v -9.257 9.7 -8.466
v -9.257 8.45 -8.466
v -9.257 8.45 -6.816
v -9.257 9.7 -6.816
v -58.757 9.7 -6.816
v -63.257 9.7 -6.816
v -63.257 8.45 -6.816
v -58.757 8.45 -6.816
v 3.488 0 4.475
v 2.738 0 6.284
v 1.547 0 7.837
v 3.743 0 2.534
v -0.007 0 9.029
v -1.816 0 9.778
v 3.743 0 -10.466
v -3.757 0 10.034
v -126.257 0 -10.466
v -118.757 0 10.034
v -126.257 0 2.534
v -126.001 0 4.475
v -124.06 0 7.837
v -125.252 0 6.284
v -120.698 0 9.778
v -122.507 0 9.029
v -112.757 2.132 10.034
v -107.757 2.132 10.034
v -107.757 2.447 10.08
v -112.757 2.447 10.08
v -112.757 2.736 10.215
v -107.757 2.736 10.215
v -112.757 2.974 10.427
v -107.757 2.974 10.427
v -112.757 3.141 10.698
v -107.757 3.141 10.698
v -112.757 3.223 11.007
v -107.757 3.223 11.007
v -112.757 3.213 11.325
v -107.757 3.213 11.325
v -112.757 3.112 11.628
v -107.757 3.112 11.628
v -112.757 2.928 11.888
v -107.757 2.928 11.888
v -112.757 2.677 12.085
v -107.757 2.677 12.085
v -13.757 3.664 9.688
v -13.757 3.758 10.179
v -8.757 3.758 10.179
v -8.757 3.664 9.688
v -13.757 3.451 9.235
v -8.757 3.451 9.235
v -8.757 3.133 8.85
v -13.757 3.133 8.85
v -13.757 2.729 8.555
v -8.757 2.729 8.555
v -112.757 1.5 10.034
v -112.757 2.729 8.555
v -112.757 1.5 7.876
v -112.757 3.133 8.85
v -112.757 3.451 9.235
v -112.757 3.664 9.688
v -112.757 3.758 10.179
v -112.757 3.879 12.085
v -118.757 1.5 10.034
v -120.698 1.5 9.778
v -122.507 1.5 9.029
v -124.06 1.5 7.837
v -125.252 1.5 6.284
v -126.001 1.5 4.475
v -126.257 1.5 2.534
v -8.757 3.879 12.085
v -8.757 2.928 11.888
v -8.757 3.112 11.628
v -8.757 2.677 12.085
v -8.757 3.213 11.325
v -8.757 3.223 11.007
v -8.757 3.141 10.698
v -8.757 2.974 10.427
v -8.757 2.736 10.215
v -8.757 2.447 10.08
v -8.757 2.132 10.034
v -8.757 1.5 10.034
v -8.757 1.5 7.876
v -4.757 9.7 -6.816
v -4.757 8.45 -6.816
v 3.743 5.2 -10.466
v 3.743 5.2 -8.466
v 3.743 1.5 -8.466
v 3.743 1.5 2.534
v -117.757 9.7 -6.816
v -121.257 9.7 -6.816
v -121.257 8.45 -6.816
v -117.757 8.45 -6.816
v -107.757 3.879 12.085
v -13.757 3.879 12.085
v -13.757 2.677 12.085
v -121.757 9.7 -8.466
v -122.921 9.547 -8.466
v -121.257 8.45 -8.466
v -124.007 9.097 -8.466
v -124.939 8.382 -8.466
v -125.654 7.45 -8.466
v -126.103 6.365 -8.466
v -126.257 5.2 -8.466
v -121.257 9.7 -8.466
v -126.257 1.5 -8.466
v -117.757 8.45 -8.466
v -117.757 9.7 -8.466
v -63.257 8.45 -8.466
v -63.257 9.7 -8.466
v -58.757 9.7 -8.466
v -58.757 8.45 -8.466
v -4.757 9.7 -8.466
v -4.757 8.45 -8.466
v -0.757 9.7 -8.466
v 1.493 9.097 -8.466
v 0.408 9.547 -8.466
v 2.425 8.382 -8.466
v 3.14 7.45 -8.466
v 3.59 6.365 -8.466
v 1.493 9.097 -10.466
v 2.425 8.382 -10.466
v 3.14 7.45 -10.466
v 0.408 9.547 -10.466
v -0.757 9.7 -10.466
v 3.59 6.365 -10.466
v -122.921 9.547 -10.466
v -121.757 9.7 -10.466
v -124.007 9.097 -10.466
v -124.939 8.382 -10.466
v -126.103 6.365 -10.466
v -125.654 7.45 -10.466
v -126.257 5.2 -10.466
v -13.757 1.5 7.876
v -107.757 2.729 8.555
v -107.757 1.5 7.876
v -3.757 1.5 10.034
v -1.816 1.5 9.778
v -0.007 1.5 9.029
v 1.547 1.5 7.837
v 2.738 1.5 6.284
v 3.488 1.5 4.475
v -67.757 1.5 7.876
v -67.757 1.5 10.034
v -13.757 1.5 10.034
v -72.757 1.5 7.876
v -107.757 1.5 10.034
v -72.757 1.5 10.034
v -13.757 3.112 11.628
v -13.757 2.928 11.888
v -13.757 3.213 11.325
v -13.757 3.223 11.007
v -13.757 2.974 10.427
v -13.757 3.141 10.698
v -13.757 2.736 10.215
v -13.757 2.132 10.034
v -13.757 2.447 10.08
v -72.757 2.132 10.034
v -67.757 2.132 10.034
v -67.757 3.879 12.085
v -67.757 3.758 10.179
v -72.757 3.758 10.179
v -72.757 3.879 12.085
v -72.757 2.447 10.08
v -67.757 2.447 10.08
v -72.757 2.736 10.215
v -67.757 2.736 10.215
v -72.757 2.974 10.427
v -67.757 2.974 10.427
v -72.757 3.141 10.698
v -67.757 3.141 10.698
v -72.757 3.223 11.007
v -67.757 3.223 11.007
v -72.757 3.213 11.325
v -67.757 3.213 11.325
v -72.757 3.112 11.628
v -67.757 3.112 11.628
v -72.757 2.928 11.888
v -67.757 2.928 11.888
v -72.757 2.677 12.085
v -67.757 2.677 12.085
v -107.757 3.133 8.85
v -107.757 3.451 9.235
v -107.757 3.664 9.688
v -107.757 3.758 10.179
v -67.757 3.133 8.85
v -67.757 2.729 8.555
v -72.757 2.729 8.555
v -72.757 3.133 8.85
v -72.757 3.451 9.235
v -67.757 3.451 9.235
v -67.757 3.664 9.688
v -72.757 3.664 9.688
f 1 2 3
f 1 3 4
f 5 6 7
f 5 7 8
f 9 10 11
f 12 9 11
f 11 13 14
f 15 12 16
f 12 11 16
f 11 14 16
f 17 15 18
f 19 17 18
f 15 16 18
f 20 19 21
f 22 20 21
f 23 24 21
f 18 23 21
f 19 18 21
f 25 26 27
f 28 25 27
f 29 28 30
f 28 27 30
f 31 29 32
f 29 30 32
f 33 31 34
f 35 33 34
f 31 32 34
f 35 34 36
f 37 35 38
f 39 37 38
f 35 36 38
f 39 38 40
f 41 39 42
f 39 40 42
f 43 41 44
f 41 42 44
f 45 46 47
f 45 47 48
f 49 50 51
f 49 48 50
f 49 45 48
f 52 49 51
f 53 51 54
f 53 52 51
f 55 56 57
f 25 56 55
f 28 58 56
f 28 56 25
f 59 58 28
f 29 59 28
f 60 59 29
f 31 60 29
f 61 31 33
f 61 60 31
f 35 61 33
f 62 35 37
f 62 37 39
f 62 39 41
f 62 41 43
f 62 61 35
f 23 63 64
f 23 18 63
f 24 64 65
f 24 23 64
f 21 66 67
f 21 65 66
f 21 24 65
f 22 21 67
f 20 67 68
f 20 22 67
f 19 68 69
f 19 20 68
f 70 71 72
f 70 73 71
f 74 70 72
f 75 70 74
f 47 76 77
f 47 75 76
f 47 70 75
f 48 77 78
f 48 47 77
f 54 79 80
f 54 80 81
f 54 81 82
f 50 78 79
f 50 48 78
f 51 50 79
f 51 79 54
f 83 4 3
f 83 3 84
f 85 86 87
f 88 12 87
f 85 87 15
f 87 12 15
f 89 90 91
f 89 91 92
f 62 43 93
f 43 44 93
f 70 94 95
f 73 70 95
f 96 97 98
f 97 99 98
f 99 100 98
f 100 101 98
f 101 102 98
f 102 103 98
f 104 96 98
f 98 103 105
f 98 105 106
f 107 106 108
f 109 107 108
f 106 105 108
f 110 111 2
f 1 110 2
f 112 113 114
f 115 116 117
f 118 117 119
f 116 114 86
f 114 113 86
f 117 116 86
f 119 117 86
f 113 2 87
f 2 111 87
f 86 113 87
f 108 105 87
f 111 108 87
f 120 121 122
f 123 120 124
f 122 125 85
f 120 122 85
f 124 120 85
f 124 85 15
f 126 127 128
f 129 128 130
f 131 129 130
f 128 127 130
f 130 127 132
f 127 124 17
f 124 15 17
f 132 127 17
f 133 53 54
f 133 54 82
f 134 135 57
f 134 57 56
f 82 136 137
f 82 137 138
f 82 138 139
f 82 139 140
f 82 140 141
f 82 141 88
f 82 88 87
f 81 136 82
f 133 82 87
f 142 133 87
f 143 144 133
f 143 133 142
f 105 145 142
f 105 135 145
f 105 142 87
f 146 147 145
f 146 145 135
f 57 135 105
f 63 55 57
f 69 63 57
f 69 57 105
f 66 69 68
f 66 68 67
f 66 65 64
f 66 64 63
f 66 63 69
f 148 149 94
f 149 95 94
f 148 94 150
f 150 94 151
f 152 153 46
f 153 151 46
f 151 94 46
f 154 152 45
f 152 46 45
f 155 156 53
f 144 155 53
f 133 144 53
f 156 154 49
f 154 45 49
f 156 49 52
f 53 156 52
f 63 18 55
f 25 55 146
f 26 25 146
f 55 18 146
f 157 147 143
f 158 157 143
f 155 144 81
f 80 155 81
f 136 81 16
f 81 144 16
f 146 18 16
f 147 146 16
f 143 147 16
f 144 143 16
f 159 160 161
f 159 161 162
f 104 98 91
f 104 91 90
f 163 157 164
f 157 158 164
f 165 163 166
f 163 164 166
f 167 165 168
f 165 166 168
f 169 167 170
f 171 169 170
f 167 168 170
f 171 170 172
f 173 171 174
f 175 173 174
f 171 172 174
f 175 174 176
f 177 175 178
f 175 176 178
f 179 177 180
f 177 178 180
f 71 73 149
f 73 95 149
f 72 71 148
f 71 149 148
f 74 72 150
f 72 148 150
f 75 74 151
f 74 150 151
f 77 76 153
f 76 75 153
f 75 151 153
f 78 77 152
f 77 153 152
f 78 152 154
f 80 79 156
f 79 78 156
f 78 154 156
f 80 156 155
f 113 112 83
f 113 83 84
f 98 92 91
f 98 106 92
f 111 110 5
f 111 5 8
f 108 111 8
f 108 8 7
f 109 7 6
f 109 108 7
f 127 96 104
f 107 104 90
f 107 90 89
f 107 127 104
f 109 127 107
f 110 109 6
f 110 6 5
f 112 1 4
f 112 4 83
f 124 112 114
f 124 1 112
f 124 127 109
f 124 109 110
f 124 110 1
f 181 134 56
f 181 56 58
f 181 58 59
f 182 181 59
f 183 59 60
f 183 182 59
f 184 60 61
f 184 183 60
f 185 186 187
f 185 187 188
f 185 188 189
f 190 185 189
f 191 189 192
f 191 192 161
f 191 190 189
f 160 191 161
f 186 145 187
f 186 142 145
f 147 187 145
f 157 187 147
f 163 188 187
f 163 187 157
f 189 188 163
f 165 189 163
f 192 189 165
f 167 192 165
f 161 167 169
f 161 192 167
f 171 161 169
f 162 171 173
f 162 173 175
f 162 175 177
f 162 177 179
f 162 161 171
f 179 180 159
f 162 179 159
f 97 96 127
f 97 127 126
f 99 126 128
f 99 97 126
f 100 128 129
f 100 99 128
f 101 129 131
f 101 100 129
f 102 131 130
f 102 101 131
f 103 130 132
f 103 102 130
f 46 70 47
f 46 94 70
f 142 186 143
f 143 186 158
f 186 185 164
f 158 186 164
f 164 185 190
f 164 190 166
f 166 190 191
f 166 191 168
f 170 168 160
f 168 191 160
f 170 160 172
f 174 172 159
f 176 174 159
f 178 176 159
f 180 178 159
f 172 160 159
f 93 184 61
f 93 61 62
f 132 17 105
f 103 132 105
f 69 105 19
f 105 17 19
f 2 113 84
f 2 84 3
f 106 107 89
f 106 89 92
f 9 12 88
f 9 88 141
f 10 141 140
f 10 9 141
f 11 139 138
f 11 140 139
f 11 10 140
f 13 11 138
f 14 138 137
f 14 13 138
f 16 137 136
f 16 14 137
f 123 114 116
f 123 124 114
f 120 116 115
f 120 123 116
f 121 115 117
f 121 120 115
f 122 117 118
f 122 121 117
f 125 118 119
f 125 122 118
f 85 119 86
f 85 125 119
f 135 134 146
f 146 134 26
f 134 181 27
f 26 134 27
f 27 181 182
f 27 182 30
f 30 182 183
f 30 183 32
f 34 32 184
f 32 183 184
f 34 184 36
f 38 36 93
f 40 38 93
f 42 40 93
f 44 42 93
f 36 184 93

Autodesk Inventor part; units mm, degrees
ref_plane "YZ Plane" through (0, 0, 0) normal (1, 0, 0) x (0, 1, 0)
ref_plane "XZ Plane" through (0, 0, 0) normal (0, 1, 0) x (-1, 0, 0)
ref_plane "XY Plane" through (0, 0, 0) normal (0, 0, 1) x (1, 0, 0)
sketch "Эскиз1" plane through (0, 0, 0) normal (0, 1, 0) x (-1, 0, 0)
  line L0 (118.7568, 10.0335) -> (3.7568, 10.0335)
  line L1 (-3.7432, 2.5335) -> (-3.7432, -10.4665)
  line L2 (-3.7432, -10.4665) -> (126.2568, -10.4665)
  line L3 (126.2568, -10.4665) -> (126.2568, 2.5335)
  arc A0 (3.7568, 10.0335) -> (-3.7432, 2.5335) centre (3.7568, 2.5335) ccw
  arc A1 (126.2568, 2.5335) -> (118.7568, 10.0335) centre (118.7568, 2.5335) ccw
  point P0 (0, 0)
  point P1 (-3.7432, 10.0335)
  dimension "d0" = 20.5
  dimension "d1" = 130
  dimension "d2" = 7.5
  dimension "d3" = 7.5
extrude "Выдавливание1" add sketch "Эскиз1" along normal blind 1.5
sketch "Эскиз2" plane through (0, 1.5, 0) normal (0, 1, 0) x (1, 0, 0)
  line L0 (3.7432, -2.5335) -> (3.7432, 10.4665) projected
  line L1 (-126.2568, 10.4665) -> (-126.2568, -2.5335) projected
  line L2 (3.7432, 10.4665) -> (-126.2568, 10.4665)
  line L3 (-126.2568, 10.4665) -> (-126.2568, 8.4665)
  line L4 (-126.2568, 8.4665) -> (3.7432, 8.4665)
  line L5 (3.7432, 8.4665) -> (3.7432, 10.4665)
  point P0 (0, 0)
  point P1 (3.7432, 8.4665)
  dimension "d6" = 2
extrude "Выдавливание2" add sketch "Эскиз2" along normal blind 8.2
fillet "Сопряжение1" radius 4.5 1 edges at (3.7432, 9.7, -9.4665)
fillet "Сопряжение2" radius 4.5 1 edges at (-126.2568, 9.7, -9.4665)
sketch "Эскиз3" plane through (-126.2568, 1.5, -8.4665) normal (0, 0, 1) x (1, 0, 0)
  line L0 (125.5, 8.2) -> (4.5, 8.2) projected
  line L1 (117, 8.2) -> (121.5, 8.2)
  line L2 (121.5, 8.2) -> (121.5, 6.95)
  line L3 (121.5, 6.95) -> (117, 6.95)
  line L4 (117, 6.95) -> (117, 8.2)
  line L5 (130, 0) -> (130, 3.7) projected
  line L6 (63, 8.2) -> (67.5, 8.2)
  line L7 (67.5, 8.2) -> (67.5, 6.95)
  line L8 (67.5, 6.95) -> (63, 6.95)
  line L9 (63, 6.95) -> (63, 8.2)
  line L10 (5, 8.2) -> (8.5, 8.2)
  line L11 (8.5, 8.2) -> (8.5, 6.95)
  line L12 (8.5, 6.95) -> (5, 6.95)
  line L13 (5, 6.95) -> (5, 8.2)
  point P0 (126.2568, -1.5)
  point P1 (121.5, 7.575)
  point P2 (63, 7.575)
  point P3 (67.5, 7.575)
  point P4 (8.5, 8.2)
  dimension "d11" = 8.5
  dimension "d12" = 4.5
  dimension "d13" = 1.25
  dimension "d14" = 58.5
  dimension "d15" = 4.5
  dimension "d16" = 1.25
  dimension "d17" = 62.5
  dimension "d18" = 3.5
  dimension "d19" = 1.25
extrude "Выдавливание3" add sketch "Эскиз3" along normal blind 1.65
ref_plane "РабПлоскость1" through (-13.7568, 0, 2.5335) normal (1, 0, 0) x (0, 0, -1)
sketch "Эскиз4" plane through (-13.7568, 0, 2.5335) normal (1, 0, 0) x (0, 0, -1)
  line L0 (-9.5515, 3.8793) -> (-9.5515, 2.1493)
  line L1 (-9.5515, 3.8793) -> (-7.6452, 3.758)
  line L2 (-6.0216, 2.729) -> (-5.3427, 1.5)
  line L3 (-7.5, 1.5) -> (-7.5, 3.23)
  arc A0 (-6.0216, 2.729) -> (-7.6452, 3.758) centre (-7.7722, 1.762) ccw
  line L4 (-8.5983, 0.5037) -> (-8.5983, 3.23) construction
  line L5 (-9.6967, 1.602) -> (-9.6967, 2.1317)
  line L6 (-7.5, 2.1317) -> (-7.5, 1.602)
  arc A1 (-9.6967, 1.602) -> (-7.5, 1.602) centre (-8.5983, 1.602) ccw
  arc A2 (-7.5, 2.1317) -> (-9.6967, 2.1317) centre (-8.5983, 2.1317) ccw
  line L7 (0, 1.5) -> (-7.5, 1.5) projected
  line L8 (-5.3427, 1.5) -> (-7.5, 1.5)
  point P0 (2.5335, 0)
  point P1 (-6.5515, 3.6883)
  point P2 (-8.5983, 1.8668)
  point P3 (-9.5515, 2.6775)
  dimension "d23" = 1.73
  dimension "d24" = 3
  dimension "d25" = 2.5
  dimension "d26" = 1.73
  dimension "d27" = 2
extrude "Выдавливание4" add sketch "Эскиз4" along normal blind 5 contours L1 A0 L2 L7 L3 A2 L0
ref_plane "РабПлоскость2" through (-40.7568, 0, 2.5335) normal (1, 0, 0) x (0, 0, -1)
mirror "Зеркальное отражение1" about plane through (-40.7568, 0, 2.5335) normal (1, 0, 0) of "Выдавливание4"
ref_plane "РабПлоскость3" through (-60.7568, 0, 2.5335) normal (1, 0, 0) x (0, 0, -1)
mirror "Зеркальное отражение2" about plane through (-60.7568, 0, 2.5335) normal (1, 0, 0) of "Выдавливание4"
sketch "Эскиз5" plane through (0, 1.5, 0) normal (0, 1, 0) x (1, 0, 0)
  point P0 (0, 0)
ref_plane "РабПлоскость4" through (0, 6, 0) normal (0, 1, 0) x (1, 0, 0)
sketch "Эскиз6" plane through (0, 6, 0) normal (0, 1, 0) x (1, 0, 0)
  line L0 (-107.513, 6.4665) -> (-116.163, 6.4665)
  line L1 (-116.163, 6.4665) -> (-116.163, -5.5335)
  line L2 (-116.163, -5.5335) -> (-107.513, -5.5335)
  line L3 (-107.513, -5.5335) -> (-107.513, 6.4665)
  line L4 (-117.7568, 8.4665) -> (-63.2568, 8.4665) projected
  point P0 (0, 0)
  point P1 (-111.838, 6.4665)
  dimension "d33" = 12
  dimension "d34" = 8.65
  dimension "d35" = 2
properties part number "k400+ крышка"
